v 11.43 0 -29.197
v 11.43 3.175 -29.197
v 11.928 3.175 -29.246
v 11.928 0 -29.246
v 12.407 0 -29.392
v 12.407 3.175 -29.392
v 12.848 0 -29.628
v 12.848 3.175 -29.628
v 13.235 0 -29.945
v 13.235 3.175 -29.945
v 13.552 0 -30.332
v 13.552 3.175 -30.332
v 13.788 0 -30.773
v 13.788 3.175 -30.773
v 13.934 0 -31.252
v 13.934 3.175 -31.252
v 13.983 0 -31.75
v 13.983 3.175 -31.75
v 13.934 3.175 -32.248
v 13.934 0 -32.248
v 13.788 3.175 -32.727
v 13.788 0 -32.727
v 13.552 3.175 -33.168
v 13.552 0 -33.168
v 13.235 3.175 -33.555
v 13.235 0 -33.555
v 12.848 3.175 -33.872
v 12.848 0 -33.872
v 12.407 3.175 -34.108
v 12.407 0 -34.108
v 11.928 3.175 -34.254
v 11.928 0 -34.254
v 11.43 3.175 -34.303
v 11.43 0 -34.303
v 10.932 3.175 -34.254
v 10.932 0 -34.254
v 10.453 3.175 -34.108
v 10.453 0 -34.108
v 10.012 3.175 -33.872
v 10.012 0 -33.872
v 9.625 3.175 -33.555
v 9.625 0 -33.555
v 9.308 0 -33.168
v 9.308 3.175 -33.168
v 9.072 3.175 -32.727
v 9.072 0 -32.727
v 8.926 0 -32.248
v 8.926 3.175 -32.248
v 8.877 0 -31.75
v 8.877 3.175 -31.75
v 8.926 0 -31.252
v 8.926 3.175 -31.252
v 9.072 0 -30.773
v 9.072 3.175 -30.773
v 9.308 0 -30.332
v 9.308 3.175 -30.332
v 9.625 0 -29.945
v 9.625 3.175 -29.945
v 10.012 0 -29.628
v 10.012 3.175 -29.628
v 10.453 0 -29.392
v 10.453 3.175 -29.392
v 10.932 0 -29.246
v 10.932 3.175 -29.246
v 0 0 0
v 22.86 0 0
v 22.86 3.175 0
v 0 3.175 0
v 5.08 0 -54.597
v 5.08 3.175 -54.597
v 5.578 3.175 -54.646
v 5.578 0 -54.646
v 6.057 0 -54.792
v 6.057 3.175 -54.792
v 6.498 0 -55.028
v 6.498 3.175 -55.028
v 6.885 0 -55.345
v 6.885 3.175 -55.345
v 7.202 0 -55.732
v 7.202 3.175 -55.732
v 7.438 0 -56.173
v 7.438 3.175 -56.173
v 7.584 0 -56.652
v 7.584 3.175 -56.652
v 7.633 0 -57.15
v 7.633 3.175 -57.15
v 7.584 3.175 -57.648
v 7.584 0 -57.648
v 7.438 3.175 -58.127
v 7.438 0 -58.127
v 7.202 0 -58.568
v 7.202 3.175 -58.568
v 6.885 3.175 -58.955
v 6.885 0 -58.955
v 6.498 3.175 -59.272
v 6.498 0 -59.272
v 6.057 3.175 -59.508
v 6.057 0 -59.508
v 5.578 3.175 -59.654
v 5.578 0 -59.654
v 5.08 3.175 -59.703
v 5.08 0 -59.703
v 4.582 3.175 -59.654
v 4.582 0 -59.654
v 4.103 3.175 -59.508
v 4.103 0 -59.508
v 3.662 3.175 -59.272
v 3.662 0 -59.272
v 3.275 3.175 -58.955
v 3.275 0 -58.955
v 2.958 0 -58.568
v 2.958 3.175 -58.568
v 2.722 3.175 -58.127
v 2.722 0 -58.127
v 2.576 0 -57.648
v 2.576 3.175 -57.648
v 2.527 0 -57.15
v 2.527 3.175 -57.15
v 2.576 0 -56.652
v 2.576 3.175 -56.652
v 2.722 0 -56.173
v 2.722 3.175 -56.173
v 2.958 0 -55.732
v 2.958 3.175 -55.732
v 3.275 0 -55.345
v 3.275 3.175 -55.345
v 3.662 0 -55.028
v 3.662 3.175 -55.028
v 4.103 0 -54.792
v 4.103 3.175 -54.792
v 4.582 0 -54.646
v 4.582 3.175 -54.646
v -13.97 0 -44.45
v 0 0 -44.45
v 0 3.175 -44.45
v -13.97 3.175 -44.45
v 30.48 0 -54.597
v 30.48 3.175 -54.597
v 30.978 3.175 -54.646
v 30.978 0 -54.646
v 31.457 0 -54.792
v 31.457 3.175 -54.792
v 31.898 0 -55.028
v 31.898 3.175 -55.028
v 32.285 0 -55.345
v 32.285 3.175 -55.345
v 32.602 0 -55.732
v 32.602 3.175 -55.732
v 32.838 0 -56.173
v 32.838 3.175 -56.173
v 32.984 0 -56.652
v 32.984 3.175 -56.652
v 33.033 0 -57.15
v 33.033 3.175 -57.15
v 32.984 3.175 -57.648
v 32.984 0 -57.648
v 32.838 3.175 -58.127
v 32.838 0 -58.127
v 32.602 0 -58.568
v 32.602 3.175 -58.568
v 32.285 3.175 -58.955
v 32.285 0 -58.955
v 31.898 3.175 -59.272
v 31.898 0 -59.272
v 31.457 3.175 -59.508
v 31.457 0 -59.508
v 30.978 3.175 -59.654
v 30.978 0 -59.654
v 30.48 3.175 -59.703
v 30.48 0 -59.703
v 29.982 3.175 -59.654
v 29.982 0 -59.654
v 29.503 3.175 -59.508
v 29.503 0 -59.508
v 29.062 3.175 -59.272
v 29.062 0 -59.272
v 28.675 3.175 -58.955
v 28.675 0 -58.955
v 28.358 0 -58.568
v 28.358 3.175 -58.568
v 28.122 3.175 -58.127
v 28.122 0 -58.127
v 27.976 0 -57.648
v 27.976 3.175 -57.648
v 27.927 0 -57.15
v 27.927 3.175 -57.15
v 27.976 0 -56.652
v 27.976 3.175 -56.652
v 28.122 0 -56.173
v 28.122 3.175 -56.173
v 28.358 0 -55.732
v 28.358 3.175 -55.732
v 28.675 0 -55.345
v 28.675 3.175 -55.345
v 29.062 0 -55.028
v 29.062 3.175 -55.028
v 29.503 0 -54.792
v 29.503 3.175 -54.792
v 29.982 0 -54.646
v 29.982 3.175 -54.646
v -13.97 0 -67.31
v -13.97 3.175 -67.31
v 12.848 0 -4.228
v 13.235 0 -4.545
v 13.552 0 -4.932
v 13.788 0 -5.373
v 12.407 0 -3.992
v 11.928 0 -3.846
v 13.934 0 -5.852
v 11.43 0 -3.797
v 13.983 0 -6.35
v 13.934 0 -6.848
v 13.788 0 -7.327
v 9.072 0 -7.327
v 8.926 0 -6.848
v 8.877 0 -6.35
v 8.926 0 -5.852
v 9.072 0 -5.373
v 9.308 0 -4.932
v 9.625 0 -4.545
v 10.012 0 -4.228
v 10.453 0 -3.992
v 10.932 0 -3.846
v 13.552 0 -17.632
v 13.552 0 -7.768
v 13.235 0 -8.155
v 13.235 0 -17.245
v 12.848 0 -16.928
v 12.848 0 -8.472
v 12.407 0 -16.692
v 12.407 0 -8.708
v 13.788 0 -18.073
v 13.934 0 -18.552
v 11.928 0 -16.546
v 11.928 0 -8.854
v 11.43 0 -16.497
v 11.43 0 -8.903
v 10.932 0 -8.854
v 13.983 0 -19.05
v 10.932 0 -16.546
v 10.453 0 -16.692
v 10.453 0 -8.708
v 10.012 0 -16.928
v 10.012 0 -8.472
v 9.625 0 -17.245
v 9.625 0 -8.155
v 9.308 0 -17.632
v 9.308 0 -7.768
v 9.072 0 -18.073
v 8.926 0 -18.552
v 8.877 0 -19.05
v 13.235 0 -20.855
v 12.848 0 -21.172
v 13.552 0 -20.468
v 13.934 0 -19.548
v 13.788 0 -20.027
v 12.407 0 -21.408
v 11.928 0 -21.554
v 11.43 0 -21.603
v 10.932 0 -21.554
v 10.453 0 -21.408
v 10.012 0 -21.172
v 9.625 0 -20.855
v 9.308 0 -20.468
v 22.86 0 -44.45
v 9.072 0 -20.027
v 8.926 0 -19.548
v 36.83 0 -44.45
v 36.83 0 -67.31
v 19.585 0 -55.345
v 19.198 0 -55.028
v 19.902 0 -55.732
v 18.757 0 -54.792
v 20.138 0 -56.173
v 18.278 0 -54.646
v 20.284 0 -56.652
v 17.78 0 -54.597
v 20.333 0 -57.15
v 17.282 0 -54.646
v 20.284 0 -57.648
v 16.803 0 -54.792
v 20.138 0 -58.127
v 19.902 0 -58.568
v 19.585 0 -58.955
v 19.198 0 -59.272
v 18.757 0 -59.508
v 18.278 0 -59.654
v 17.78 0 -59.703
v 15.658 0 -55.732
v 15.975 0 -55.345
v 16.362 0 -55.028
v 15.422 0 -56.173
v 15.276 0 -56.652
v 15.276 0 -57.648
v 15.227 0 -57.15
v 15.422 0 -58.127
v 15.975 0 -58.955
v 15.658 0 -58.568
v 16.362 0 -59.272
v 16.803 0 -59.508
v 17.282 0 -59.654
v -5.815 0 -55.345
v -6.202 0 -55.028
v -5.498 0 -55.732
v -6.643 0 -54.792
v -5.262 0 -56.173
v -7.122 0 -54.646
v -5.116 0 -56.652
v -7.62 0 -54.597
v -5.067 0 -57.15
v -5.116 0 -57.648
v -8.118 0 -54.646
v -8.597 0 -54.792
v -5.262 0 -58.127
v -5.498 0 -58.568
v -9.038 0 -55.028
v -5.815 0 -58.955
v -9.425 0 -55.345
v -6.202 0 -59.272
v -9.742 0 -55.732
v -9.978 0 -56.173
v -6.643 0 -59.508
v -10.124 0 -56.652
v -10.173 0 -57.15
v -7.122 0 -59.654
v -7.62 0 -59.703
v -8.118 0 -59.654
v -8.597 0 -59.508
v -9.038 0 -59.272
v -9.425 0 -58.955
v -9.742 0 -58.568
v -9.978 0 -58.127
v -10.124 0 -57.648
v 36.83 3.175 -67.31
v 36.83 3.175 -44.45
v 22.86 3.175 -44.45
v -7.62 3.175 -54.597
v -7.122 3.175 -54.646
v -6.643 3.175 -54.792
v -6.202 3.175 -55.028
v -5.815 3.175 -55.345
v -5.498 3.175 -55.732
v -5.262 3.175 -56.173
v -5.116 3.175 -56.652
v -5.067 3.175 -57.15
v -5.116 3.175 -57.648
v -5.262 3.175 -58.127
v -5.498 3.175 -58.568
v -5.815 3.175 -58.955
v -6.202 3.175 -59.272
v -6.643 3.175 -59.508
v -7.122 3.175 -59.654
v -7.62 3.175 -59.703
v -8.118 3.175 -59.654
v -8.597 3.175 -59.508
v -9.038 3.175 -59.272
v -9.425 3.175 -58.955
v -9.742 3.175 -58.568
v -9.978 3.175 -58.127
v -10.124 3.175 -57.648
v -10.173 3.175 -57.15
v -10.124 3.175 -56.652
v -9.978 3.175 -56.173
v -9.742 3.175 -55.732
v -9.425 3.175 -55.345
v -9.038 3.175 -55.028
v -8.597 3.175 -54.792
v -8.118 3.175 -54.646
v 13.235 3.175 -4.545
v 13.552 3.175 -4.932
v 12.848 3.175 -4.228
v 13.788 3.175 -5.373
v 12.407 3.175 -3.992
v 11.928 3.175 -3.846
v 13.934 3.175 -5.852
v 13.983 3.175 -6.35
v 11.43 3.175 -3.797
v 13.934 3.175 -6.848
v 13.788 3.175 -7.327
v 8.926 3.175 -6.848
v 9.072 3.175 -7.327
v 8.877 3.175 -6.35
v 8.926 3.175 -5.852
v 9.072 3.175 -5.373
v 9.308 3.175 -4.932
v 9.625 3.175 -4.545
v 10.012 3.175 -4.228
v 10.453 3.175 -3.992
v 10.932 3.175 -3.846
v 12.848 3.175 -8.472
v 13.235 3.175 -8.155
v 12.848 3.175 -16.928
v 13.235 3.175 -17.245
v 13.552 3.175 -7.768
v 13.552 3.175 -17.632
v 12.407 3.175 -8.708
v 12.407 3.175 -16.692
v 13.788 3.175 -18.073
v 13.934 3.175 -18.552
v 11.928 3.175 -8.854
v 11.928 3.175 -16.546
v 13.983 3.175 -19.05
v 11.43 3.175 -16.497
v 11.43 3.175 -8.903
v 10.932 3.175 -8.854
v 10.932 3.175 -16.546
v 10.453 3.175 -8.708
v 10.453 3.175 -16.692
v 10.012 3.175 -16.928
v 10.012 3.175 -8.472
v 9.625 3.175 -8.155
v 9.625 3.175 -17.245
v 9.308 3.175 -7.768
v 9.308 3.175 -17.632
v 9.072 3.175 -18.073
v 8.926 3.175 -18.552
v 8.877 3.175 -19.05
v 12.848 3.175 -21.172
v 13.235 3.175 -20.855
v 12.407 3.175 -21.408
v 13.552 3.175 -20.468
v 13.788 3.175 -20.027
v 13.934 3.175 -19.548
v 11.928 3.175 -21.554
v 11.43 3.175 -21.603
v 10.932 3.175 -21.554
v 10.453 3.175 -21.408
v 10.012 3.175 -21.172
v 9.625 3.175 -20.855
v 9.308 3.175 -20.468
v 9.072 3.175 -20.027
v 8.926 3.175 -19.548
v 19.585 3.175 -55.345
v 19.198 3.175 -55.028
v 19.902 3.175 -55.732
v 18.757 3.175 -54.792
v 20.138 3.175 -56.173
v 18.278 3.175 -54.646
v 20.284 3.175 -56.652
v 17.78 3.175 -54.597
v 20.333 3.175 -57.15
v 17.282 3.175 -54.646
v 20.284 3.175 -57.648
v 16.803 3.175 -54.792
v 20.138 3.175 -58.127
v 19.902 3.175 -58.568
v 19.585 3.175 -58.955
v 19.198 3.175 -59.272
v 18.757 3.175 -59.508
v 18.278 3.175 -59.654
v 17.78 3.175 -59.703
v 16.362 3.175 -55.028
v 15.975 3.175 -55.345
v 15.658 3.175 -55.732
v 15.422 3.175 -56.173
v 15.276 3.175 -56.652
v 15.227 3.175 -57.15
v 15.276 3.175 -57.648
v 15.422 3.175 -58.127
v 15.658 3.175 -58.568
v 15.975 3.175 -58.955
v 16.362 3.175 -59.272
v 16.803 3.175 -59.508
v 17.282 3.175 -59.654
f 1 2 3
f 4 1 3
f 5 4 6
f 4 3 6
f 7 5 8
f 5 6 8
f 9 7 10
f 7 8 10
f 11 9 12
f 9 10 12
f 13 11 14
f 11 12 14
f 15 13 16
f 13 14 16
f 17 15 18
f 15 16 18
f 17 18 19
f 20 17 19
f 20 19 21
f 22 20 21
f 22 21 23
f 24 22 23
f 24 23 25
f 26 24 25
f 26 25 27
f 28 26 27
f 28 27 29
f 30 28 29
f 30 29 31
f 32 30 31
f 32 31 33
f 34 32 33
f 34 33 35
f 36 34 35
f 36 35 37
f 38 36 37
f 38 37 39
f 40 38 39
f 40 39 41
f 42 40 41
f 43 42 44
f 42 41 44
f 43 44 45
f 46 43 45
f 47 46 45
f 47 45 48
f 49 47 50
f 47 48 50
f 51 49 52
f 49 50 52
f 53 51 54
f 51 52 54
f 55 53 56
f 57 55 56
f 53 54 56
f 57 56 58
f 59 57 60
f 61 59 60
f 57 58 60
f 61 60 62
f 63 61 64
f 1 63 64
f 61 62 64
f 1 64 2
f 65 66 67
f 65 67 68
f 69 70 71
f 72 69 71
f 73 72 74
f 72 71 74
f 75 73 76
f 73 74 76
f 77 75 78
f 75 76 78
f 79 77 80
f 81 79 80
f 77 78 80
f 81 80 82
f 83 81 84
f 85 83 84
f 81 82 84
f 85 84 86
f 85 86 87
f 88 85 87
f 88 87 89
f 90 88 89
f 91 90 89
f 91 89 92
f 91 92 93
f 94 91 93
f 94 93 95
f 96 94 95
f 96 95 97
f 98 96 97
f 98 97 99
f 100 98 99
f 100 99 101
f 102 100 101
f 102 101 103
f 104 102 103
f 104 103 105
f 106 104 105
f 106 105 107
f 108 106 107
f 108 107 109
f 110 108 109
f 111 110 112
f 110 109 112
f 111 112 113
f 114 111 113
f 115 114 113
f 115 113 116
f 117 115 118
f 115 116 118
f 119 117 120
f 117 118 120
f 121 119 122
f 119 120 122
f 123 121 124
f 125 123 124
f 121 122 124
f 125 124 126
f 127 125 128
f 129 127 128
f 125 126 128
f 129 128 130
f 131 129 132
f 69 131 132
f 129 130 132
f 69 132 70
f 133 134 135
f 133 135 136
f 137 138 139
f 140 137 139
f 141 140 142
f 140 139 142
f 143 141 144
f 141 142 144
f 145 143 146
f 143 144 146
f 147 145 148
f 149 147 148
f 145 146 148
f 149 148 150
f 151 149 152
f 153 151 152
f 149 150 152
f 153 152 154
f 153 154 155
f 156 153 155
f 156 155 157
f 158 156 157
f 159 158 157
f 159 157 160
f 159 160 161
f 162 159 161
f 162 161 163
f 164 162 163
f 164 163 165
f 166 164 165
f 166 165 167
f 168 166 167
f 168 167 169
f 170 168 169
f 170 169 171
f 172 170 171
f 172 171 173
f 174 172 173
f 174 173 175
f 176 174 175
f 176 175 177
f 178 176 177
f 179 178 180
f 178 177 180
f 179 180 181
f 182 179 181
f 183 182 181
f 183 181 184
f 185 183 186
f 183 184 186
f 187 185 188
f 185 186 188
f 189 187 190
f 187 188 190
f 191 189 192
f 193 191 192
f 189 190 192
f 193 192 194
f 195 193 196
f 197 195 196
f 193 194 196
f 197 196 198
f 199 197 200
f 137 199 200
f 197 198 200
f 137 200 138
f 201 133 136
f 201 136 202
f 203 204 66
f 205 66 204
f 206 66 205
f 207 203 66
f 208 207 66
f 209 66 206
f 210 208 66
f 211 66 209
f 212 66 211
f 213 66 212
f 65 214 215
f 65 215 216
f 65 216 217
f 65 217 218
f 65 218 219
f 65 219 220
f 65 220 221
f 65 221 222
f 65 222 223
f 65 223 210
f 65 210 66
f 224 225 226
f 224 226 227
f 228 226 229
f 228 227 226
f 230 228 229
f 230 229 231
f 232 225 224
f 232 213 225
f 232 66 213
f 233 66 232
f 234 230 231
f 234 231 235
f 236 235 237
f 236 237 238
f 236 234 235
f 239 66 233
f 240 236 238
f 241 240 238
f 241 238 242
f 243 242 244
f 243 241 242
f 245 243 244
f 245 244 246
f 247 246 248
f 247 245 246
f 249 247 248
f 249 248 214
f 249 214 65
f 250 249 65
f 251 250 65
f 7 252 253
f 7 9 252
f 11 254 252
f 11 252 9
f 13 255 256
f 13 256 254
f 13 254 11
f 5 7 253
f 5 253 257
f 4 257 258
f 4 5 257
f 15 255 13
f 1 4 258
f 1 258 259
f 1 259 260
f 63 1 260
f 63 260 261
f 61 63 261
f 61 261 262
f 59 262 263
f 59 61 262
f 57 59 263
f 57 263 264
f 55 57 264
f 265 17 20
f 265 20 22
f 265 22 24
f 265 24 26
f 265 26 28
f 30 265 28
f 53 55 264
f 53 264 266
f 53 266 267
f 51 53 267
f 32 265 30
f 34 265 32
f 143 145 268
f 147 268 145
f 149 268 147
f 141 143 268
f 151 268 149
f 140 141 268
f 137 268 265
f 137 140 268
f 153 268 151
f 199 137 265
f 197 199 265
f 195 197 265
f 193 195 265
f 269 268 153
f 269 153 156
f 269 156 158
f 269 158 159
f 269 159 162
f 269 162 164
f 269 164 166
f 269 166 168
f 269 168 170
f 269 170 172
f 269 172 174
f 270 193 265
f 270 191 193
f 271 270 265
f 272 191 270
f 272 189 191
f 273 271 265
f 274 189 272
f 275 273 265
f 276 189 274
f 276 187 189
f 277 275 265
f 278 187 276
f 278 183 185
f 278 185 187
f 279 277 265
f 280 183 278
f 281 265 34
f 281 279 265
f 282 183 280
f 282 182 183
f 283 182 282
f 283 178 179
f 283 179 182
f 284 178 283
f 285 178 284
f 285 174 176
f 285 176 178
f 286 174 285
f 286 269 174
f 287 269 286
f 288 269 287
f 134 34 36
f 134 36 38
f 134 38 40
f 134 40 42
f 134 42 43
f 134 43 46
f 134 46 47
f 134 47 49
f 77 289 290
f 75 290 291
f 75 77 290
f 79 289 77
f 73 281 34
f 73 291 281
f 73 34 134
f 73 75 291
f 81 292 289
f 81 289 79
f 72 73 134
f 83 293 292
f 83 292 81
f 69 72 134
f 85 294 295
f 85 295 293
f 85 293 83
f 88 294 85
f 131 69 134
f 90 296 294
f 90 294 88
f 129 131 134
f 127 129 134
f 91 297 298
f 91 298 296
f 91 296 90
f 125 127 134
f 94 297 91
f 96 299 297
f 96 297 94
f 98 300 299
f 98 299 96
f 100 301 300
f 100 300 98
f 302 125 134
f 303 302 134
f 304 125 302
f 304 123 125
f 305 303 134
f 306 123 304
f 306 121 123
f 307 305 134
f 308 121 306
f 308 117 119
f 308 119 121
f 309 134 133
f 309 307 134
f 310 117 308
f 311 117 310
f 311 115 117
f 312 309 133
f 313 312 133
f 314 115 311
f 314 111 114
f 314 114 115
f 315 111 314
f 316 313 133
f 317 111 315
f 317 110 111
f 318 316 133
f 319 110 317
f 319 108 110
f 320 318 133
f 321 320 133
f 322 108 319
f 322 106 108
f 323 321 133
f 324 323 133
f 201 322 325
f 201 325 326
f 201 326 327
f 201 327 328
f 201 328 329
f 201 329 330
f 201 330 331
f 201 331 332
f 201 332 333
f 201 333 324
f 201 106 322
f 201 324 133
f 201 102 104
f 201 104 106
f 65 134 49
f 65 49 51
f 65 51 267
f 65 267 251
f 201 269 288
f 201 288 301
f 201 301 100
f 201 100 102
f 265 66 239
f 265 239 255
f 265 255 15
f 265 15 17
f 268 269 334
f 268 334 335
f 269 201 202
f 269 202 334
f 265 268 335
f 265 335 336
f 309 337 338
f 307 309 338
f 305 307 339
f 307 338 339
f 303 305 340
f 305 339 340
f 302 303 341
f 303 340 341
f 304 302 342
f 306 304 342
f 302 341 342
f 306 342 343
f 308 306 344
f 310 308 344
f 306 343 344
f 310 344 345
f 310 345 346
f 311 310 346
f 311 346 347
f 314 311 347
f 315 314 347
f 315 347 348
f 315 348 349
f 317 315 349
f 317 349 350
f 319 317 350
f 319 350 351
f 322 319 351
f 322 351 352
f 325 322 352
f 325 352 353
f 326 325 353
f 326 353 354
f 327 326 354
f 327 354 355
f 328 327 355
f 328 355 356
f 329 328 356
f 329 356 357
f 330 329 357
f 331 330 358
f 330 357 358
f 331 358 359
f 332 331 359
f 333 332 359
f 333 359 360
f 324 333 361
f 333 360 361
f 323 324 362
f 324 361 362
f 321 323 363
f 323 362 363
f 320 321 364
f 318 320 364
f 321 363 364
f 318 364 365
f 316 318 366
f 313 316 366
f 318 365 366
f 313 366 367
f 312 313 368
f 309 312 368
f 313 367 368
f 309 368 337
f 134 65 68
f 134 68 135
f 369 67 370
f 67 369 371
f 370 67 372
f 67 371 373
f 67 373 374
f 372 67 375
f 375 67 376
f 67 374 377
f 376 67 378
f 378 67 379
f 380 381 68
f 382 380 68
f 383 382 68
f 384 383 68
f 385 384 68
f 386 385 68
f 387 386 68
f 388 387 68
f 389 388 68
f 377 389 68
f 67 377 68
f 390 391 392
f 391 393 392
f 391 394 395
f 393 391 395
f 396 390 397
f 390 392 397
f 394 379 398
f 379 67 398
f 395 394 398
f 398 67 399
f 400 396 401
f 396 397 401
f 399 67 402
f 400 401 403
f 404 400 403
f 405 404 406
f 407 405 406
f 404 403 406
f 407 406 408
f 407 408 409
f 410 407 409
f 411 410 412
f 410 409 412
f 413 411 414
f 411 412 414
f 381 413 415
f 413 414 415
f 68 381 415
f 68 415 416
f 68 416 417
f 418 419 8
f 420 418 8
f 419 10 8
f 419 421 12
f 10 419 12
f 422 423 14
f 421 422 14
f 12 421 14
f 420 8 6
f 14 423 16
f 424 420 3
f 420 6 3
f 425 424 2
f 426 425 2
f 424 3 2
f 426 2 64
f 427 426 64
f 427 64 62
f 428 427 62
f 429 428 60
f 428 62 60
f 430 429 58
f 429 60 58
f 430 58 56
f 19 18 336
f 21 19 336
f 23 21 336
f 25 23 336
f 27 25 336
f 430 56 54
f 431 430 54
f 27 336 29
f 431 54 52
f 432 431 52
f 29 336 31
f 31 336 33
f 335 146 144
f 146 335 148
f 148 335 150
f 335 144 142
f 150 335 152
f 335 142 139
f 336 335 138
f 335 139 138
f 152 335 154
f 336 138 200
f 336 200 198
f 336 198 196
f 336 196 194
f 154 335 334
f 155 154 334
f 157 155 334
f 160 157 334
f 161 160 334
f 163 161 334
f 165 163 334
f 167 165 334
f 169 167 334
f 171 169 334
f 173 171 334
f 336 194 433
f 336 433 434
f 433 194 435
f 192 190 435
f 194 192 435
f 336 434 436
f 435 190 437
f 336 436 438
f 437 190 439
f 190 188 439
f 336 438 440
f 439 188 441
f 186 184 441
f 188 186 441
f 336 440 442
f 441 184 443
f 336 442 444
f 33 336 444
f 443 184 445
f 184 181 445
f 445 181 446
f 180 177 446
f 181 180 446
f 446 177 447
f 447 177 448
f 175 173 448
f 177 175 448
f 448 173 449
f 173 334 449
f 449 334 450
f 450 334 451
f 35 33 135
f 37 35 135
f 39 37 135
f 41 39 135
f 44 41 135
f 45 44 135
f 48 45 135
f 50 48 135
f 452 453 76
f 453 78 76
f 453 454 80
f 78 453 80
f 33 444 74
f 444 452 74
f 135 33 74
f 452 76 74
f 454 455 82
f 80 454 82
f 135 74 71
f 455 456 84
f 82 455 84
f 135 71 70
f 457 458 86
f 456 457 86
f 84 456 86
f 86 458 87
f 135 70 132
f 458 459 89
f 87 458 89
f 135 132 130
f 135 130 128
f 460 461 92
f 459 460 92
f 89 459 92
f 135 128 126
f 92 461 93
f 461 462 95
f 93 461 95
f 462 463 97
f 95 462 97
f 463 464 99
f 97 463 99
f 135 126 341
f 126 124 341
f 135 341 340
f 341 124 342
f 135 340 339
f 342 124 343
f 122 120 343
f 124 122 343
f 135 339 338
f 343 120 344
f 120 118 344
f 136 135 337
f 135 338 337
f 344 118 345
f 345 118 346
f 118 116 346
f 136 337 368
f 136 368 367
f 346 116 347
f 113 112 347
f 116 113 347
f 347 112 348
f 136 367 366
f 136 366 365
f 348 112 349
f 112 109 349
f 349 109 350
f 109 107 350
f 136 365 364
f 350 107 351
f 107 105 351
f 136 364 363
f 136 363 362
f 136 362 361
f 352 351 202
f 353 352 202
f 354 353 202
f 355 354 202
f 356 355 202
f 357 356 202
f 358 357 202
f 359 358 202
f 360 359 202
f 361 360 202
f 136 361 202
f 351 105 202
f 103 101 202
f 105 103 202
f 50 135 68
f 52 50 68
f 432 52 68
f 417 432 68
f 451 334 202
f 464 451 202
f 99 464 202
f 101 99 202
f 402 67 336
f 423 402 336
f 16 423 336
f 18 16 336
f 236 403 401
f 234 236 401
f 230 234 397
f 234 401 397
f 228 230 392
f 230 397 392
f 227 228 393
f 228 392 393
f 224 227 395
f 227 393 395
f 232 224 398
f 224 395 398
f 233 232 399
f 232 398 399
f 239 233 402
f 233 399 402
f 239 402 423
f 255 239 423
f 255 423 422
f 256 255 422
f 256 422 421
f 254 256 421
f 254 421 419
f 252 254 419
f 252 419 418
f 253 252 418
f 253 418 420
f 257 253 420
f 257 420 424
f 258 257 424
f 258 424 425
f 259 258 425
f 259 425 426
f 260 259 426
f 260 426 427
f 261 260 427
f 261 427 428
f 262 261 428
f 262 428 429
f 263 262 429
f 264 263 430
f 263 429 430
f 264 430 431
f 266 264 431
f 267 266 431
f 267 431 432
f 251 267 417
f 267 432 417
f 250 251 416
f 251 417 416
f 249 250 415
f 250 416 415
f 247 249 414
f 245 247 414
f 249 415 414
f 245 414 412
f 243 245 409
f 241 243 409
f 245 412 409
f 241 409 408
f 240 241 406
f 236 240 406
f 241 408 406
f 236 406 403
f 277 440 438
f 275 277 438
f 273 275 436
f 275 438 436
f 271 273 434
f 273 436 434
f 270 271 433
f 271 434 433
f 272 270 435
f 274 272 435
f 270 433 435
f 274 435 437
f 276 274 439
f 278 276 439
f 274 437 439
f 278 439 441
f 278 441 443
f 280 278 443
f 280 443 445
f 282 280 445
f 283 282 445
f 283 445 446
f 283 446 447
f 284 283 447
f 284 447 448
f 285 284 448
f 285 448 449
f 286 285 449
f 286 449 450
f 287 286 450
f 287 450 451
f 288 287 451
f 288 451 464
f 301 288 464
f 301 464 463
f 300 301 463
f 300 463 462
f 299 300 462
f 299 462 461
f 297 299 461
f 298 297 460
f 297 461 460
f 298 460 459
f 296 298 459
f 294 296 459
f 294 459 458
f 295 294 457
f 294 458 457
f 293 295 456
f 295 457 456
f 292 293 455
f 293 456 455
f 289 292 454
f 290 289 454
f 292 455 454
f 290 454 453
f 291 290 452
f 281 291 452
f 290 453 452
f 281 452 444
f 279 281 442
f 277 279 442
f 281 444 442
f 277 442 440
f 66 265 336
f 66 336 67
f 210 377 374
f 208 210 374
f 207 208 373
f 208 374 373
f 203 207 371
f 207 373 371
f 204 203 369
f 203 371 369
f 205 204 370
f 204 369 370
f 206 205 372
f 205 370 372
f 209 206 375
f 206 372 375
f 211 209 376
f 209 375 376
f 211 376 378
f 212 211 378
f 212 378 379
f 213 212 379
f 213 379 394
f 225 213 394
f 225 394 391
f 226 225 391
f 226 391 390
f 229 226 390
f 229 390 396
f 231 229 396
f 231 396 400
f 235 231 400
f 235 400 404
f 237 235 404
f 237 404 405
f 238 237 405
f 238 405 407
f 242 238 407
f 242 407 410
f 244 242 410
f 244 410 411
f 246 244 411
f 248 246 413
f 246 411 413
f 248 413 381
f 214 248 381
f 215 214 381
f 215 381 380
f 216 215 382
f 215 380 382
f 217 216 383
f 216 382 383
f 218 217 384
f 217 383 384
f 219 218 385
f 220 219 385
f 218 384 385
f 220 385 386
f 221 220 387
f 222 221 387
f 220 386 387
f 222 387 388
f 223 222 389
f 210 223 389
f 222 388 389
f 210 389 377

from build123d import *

# Parameters (mm, degrees)
BOSS_EXTRUDE1_DEPTH = 3.175
SKETCH2_R           = 2.5527
CUT_EXTRUDE1_DEPTH  = 77.793005053
SKETCH3_R           = 2.5527
CUT_EXTRUDE2_DEPTH  = 77.793005053


with BuildPart() as part:
    # Sketch1 → Boss-Extrude1 (new body)
    with BuildSketch(Plane(origin=(0, 0, 0), x_dir=(1, 0, 0), z_dir=(0, 1, 0))):
        Polygon((0, 0), (0, 44.45), (-13.97, 44.45), (-13.97, 67.31), (36.83, 67.31), (36.83, 44.45), (22.86, 44.45), (22.86, 0), align=None)
    extrude(amount=BOSS_EXTRUDE1_DEPTH)

    # Sketch2 → Cut-Extrude1 (cut, through all)
    with BuildSketch(Plane(origin=(0, 3.175, 0), x_dir=(1, 0, 0), z_dir=(0, 1, 0))):
        with Locations(Location((-7.62, 57.15, 0), (0, 0, 270))):
            Circle(SKETCH2_R)
        with Locations(Location((5.08, 57.15, 0), (0, 0, 270))):
            Circle(SKETCH2_R)
        with Locations(Location((17.78, 57.15, 0), (0, 0, 270))):
            Circle(SKETCH2_R)
        with Locations(Location((30.48, 57.15, 0), (0, 0, 270))):
            Circle(SKETCH2_R)
    extrude(amount=-CUT_EXTRUDE1_DEPTH, mode=Mode.SUBTRACT)

    # Sketch3 → Cut-Extrude2 (cut, through all)
    with BuildSketch(Plane(origin=(0, 3.175, 0), x_dir=(1, 0, 0), z_dir=(0, 1, 0))):
        with Locations(Location((11.43, 31.75, 0), (0, 0, 270))):
            Circle(SKETCH3_R)
        with Locations(Location((11.43, 19.05, 0), (0, 0, 270))):
            Circle(SKETCH3_R)
        with Locations(Location((11.43, 6.35, 0), (0, 0, 270))):
            Circle(SKETCH3_R)
    extrude(amount=-CUT_EXTRUDE2_DEPTH, mode=Mode.SUBTRACT)


solid = part.part
